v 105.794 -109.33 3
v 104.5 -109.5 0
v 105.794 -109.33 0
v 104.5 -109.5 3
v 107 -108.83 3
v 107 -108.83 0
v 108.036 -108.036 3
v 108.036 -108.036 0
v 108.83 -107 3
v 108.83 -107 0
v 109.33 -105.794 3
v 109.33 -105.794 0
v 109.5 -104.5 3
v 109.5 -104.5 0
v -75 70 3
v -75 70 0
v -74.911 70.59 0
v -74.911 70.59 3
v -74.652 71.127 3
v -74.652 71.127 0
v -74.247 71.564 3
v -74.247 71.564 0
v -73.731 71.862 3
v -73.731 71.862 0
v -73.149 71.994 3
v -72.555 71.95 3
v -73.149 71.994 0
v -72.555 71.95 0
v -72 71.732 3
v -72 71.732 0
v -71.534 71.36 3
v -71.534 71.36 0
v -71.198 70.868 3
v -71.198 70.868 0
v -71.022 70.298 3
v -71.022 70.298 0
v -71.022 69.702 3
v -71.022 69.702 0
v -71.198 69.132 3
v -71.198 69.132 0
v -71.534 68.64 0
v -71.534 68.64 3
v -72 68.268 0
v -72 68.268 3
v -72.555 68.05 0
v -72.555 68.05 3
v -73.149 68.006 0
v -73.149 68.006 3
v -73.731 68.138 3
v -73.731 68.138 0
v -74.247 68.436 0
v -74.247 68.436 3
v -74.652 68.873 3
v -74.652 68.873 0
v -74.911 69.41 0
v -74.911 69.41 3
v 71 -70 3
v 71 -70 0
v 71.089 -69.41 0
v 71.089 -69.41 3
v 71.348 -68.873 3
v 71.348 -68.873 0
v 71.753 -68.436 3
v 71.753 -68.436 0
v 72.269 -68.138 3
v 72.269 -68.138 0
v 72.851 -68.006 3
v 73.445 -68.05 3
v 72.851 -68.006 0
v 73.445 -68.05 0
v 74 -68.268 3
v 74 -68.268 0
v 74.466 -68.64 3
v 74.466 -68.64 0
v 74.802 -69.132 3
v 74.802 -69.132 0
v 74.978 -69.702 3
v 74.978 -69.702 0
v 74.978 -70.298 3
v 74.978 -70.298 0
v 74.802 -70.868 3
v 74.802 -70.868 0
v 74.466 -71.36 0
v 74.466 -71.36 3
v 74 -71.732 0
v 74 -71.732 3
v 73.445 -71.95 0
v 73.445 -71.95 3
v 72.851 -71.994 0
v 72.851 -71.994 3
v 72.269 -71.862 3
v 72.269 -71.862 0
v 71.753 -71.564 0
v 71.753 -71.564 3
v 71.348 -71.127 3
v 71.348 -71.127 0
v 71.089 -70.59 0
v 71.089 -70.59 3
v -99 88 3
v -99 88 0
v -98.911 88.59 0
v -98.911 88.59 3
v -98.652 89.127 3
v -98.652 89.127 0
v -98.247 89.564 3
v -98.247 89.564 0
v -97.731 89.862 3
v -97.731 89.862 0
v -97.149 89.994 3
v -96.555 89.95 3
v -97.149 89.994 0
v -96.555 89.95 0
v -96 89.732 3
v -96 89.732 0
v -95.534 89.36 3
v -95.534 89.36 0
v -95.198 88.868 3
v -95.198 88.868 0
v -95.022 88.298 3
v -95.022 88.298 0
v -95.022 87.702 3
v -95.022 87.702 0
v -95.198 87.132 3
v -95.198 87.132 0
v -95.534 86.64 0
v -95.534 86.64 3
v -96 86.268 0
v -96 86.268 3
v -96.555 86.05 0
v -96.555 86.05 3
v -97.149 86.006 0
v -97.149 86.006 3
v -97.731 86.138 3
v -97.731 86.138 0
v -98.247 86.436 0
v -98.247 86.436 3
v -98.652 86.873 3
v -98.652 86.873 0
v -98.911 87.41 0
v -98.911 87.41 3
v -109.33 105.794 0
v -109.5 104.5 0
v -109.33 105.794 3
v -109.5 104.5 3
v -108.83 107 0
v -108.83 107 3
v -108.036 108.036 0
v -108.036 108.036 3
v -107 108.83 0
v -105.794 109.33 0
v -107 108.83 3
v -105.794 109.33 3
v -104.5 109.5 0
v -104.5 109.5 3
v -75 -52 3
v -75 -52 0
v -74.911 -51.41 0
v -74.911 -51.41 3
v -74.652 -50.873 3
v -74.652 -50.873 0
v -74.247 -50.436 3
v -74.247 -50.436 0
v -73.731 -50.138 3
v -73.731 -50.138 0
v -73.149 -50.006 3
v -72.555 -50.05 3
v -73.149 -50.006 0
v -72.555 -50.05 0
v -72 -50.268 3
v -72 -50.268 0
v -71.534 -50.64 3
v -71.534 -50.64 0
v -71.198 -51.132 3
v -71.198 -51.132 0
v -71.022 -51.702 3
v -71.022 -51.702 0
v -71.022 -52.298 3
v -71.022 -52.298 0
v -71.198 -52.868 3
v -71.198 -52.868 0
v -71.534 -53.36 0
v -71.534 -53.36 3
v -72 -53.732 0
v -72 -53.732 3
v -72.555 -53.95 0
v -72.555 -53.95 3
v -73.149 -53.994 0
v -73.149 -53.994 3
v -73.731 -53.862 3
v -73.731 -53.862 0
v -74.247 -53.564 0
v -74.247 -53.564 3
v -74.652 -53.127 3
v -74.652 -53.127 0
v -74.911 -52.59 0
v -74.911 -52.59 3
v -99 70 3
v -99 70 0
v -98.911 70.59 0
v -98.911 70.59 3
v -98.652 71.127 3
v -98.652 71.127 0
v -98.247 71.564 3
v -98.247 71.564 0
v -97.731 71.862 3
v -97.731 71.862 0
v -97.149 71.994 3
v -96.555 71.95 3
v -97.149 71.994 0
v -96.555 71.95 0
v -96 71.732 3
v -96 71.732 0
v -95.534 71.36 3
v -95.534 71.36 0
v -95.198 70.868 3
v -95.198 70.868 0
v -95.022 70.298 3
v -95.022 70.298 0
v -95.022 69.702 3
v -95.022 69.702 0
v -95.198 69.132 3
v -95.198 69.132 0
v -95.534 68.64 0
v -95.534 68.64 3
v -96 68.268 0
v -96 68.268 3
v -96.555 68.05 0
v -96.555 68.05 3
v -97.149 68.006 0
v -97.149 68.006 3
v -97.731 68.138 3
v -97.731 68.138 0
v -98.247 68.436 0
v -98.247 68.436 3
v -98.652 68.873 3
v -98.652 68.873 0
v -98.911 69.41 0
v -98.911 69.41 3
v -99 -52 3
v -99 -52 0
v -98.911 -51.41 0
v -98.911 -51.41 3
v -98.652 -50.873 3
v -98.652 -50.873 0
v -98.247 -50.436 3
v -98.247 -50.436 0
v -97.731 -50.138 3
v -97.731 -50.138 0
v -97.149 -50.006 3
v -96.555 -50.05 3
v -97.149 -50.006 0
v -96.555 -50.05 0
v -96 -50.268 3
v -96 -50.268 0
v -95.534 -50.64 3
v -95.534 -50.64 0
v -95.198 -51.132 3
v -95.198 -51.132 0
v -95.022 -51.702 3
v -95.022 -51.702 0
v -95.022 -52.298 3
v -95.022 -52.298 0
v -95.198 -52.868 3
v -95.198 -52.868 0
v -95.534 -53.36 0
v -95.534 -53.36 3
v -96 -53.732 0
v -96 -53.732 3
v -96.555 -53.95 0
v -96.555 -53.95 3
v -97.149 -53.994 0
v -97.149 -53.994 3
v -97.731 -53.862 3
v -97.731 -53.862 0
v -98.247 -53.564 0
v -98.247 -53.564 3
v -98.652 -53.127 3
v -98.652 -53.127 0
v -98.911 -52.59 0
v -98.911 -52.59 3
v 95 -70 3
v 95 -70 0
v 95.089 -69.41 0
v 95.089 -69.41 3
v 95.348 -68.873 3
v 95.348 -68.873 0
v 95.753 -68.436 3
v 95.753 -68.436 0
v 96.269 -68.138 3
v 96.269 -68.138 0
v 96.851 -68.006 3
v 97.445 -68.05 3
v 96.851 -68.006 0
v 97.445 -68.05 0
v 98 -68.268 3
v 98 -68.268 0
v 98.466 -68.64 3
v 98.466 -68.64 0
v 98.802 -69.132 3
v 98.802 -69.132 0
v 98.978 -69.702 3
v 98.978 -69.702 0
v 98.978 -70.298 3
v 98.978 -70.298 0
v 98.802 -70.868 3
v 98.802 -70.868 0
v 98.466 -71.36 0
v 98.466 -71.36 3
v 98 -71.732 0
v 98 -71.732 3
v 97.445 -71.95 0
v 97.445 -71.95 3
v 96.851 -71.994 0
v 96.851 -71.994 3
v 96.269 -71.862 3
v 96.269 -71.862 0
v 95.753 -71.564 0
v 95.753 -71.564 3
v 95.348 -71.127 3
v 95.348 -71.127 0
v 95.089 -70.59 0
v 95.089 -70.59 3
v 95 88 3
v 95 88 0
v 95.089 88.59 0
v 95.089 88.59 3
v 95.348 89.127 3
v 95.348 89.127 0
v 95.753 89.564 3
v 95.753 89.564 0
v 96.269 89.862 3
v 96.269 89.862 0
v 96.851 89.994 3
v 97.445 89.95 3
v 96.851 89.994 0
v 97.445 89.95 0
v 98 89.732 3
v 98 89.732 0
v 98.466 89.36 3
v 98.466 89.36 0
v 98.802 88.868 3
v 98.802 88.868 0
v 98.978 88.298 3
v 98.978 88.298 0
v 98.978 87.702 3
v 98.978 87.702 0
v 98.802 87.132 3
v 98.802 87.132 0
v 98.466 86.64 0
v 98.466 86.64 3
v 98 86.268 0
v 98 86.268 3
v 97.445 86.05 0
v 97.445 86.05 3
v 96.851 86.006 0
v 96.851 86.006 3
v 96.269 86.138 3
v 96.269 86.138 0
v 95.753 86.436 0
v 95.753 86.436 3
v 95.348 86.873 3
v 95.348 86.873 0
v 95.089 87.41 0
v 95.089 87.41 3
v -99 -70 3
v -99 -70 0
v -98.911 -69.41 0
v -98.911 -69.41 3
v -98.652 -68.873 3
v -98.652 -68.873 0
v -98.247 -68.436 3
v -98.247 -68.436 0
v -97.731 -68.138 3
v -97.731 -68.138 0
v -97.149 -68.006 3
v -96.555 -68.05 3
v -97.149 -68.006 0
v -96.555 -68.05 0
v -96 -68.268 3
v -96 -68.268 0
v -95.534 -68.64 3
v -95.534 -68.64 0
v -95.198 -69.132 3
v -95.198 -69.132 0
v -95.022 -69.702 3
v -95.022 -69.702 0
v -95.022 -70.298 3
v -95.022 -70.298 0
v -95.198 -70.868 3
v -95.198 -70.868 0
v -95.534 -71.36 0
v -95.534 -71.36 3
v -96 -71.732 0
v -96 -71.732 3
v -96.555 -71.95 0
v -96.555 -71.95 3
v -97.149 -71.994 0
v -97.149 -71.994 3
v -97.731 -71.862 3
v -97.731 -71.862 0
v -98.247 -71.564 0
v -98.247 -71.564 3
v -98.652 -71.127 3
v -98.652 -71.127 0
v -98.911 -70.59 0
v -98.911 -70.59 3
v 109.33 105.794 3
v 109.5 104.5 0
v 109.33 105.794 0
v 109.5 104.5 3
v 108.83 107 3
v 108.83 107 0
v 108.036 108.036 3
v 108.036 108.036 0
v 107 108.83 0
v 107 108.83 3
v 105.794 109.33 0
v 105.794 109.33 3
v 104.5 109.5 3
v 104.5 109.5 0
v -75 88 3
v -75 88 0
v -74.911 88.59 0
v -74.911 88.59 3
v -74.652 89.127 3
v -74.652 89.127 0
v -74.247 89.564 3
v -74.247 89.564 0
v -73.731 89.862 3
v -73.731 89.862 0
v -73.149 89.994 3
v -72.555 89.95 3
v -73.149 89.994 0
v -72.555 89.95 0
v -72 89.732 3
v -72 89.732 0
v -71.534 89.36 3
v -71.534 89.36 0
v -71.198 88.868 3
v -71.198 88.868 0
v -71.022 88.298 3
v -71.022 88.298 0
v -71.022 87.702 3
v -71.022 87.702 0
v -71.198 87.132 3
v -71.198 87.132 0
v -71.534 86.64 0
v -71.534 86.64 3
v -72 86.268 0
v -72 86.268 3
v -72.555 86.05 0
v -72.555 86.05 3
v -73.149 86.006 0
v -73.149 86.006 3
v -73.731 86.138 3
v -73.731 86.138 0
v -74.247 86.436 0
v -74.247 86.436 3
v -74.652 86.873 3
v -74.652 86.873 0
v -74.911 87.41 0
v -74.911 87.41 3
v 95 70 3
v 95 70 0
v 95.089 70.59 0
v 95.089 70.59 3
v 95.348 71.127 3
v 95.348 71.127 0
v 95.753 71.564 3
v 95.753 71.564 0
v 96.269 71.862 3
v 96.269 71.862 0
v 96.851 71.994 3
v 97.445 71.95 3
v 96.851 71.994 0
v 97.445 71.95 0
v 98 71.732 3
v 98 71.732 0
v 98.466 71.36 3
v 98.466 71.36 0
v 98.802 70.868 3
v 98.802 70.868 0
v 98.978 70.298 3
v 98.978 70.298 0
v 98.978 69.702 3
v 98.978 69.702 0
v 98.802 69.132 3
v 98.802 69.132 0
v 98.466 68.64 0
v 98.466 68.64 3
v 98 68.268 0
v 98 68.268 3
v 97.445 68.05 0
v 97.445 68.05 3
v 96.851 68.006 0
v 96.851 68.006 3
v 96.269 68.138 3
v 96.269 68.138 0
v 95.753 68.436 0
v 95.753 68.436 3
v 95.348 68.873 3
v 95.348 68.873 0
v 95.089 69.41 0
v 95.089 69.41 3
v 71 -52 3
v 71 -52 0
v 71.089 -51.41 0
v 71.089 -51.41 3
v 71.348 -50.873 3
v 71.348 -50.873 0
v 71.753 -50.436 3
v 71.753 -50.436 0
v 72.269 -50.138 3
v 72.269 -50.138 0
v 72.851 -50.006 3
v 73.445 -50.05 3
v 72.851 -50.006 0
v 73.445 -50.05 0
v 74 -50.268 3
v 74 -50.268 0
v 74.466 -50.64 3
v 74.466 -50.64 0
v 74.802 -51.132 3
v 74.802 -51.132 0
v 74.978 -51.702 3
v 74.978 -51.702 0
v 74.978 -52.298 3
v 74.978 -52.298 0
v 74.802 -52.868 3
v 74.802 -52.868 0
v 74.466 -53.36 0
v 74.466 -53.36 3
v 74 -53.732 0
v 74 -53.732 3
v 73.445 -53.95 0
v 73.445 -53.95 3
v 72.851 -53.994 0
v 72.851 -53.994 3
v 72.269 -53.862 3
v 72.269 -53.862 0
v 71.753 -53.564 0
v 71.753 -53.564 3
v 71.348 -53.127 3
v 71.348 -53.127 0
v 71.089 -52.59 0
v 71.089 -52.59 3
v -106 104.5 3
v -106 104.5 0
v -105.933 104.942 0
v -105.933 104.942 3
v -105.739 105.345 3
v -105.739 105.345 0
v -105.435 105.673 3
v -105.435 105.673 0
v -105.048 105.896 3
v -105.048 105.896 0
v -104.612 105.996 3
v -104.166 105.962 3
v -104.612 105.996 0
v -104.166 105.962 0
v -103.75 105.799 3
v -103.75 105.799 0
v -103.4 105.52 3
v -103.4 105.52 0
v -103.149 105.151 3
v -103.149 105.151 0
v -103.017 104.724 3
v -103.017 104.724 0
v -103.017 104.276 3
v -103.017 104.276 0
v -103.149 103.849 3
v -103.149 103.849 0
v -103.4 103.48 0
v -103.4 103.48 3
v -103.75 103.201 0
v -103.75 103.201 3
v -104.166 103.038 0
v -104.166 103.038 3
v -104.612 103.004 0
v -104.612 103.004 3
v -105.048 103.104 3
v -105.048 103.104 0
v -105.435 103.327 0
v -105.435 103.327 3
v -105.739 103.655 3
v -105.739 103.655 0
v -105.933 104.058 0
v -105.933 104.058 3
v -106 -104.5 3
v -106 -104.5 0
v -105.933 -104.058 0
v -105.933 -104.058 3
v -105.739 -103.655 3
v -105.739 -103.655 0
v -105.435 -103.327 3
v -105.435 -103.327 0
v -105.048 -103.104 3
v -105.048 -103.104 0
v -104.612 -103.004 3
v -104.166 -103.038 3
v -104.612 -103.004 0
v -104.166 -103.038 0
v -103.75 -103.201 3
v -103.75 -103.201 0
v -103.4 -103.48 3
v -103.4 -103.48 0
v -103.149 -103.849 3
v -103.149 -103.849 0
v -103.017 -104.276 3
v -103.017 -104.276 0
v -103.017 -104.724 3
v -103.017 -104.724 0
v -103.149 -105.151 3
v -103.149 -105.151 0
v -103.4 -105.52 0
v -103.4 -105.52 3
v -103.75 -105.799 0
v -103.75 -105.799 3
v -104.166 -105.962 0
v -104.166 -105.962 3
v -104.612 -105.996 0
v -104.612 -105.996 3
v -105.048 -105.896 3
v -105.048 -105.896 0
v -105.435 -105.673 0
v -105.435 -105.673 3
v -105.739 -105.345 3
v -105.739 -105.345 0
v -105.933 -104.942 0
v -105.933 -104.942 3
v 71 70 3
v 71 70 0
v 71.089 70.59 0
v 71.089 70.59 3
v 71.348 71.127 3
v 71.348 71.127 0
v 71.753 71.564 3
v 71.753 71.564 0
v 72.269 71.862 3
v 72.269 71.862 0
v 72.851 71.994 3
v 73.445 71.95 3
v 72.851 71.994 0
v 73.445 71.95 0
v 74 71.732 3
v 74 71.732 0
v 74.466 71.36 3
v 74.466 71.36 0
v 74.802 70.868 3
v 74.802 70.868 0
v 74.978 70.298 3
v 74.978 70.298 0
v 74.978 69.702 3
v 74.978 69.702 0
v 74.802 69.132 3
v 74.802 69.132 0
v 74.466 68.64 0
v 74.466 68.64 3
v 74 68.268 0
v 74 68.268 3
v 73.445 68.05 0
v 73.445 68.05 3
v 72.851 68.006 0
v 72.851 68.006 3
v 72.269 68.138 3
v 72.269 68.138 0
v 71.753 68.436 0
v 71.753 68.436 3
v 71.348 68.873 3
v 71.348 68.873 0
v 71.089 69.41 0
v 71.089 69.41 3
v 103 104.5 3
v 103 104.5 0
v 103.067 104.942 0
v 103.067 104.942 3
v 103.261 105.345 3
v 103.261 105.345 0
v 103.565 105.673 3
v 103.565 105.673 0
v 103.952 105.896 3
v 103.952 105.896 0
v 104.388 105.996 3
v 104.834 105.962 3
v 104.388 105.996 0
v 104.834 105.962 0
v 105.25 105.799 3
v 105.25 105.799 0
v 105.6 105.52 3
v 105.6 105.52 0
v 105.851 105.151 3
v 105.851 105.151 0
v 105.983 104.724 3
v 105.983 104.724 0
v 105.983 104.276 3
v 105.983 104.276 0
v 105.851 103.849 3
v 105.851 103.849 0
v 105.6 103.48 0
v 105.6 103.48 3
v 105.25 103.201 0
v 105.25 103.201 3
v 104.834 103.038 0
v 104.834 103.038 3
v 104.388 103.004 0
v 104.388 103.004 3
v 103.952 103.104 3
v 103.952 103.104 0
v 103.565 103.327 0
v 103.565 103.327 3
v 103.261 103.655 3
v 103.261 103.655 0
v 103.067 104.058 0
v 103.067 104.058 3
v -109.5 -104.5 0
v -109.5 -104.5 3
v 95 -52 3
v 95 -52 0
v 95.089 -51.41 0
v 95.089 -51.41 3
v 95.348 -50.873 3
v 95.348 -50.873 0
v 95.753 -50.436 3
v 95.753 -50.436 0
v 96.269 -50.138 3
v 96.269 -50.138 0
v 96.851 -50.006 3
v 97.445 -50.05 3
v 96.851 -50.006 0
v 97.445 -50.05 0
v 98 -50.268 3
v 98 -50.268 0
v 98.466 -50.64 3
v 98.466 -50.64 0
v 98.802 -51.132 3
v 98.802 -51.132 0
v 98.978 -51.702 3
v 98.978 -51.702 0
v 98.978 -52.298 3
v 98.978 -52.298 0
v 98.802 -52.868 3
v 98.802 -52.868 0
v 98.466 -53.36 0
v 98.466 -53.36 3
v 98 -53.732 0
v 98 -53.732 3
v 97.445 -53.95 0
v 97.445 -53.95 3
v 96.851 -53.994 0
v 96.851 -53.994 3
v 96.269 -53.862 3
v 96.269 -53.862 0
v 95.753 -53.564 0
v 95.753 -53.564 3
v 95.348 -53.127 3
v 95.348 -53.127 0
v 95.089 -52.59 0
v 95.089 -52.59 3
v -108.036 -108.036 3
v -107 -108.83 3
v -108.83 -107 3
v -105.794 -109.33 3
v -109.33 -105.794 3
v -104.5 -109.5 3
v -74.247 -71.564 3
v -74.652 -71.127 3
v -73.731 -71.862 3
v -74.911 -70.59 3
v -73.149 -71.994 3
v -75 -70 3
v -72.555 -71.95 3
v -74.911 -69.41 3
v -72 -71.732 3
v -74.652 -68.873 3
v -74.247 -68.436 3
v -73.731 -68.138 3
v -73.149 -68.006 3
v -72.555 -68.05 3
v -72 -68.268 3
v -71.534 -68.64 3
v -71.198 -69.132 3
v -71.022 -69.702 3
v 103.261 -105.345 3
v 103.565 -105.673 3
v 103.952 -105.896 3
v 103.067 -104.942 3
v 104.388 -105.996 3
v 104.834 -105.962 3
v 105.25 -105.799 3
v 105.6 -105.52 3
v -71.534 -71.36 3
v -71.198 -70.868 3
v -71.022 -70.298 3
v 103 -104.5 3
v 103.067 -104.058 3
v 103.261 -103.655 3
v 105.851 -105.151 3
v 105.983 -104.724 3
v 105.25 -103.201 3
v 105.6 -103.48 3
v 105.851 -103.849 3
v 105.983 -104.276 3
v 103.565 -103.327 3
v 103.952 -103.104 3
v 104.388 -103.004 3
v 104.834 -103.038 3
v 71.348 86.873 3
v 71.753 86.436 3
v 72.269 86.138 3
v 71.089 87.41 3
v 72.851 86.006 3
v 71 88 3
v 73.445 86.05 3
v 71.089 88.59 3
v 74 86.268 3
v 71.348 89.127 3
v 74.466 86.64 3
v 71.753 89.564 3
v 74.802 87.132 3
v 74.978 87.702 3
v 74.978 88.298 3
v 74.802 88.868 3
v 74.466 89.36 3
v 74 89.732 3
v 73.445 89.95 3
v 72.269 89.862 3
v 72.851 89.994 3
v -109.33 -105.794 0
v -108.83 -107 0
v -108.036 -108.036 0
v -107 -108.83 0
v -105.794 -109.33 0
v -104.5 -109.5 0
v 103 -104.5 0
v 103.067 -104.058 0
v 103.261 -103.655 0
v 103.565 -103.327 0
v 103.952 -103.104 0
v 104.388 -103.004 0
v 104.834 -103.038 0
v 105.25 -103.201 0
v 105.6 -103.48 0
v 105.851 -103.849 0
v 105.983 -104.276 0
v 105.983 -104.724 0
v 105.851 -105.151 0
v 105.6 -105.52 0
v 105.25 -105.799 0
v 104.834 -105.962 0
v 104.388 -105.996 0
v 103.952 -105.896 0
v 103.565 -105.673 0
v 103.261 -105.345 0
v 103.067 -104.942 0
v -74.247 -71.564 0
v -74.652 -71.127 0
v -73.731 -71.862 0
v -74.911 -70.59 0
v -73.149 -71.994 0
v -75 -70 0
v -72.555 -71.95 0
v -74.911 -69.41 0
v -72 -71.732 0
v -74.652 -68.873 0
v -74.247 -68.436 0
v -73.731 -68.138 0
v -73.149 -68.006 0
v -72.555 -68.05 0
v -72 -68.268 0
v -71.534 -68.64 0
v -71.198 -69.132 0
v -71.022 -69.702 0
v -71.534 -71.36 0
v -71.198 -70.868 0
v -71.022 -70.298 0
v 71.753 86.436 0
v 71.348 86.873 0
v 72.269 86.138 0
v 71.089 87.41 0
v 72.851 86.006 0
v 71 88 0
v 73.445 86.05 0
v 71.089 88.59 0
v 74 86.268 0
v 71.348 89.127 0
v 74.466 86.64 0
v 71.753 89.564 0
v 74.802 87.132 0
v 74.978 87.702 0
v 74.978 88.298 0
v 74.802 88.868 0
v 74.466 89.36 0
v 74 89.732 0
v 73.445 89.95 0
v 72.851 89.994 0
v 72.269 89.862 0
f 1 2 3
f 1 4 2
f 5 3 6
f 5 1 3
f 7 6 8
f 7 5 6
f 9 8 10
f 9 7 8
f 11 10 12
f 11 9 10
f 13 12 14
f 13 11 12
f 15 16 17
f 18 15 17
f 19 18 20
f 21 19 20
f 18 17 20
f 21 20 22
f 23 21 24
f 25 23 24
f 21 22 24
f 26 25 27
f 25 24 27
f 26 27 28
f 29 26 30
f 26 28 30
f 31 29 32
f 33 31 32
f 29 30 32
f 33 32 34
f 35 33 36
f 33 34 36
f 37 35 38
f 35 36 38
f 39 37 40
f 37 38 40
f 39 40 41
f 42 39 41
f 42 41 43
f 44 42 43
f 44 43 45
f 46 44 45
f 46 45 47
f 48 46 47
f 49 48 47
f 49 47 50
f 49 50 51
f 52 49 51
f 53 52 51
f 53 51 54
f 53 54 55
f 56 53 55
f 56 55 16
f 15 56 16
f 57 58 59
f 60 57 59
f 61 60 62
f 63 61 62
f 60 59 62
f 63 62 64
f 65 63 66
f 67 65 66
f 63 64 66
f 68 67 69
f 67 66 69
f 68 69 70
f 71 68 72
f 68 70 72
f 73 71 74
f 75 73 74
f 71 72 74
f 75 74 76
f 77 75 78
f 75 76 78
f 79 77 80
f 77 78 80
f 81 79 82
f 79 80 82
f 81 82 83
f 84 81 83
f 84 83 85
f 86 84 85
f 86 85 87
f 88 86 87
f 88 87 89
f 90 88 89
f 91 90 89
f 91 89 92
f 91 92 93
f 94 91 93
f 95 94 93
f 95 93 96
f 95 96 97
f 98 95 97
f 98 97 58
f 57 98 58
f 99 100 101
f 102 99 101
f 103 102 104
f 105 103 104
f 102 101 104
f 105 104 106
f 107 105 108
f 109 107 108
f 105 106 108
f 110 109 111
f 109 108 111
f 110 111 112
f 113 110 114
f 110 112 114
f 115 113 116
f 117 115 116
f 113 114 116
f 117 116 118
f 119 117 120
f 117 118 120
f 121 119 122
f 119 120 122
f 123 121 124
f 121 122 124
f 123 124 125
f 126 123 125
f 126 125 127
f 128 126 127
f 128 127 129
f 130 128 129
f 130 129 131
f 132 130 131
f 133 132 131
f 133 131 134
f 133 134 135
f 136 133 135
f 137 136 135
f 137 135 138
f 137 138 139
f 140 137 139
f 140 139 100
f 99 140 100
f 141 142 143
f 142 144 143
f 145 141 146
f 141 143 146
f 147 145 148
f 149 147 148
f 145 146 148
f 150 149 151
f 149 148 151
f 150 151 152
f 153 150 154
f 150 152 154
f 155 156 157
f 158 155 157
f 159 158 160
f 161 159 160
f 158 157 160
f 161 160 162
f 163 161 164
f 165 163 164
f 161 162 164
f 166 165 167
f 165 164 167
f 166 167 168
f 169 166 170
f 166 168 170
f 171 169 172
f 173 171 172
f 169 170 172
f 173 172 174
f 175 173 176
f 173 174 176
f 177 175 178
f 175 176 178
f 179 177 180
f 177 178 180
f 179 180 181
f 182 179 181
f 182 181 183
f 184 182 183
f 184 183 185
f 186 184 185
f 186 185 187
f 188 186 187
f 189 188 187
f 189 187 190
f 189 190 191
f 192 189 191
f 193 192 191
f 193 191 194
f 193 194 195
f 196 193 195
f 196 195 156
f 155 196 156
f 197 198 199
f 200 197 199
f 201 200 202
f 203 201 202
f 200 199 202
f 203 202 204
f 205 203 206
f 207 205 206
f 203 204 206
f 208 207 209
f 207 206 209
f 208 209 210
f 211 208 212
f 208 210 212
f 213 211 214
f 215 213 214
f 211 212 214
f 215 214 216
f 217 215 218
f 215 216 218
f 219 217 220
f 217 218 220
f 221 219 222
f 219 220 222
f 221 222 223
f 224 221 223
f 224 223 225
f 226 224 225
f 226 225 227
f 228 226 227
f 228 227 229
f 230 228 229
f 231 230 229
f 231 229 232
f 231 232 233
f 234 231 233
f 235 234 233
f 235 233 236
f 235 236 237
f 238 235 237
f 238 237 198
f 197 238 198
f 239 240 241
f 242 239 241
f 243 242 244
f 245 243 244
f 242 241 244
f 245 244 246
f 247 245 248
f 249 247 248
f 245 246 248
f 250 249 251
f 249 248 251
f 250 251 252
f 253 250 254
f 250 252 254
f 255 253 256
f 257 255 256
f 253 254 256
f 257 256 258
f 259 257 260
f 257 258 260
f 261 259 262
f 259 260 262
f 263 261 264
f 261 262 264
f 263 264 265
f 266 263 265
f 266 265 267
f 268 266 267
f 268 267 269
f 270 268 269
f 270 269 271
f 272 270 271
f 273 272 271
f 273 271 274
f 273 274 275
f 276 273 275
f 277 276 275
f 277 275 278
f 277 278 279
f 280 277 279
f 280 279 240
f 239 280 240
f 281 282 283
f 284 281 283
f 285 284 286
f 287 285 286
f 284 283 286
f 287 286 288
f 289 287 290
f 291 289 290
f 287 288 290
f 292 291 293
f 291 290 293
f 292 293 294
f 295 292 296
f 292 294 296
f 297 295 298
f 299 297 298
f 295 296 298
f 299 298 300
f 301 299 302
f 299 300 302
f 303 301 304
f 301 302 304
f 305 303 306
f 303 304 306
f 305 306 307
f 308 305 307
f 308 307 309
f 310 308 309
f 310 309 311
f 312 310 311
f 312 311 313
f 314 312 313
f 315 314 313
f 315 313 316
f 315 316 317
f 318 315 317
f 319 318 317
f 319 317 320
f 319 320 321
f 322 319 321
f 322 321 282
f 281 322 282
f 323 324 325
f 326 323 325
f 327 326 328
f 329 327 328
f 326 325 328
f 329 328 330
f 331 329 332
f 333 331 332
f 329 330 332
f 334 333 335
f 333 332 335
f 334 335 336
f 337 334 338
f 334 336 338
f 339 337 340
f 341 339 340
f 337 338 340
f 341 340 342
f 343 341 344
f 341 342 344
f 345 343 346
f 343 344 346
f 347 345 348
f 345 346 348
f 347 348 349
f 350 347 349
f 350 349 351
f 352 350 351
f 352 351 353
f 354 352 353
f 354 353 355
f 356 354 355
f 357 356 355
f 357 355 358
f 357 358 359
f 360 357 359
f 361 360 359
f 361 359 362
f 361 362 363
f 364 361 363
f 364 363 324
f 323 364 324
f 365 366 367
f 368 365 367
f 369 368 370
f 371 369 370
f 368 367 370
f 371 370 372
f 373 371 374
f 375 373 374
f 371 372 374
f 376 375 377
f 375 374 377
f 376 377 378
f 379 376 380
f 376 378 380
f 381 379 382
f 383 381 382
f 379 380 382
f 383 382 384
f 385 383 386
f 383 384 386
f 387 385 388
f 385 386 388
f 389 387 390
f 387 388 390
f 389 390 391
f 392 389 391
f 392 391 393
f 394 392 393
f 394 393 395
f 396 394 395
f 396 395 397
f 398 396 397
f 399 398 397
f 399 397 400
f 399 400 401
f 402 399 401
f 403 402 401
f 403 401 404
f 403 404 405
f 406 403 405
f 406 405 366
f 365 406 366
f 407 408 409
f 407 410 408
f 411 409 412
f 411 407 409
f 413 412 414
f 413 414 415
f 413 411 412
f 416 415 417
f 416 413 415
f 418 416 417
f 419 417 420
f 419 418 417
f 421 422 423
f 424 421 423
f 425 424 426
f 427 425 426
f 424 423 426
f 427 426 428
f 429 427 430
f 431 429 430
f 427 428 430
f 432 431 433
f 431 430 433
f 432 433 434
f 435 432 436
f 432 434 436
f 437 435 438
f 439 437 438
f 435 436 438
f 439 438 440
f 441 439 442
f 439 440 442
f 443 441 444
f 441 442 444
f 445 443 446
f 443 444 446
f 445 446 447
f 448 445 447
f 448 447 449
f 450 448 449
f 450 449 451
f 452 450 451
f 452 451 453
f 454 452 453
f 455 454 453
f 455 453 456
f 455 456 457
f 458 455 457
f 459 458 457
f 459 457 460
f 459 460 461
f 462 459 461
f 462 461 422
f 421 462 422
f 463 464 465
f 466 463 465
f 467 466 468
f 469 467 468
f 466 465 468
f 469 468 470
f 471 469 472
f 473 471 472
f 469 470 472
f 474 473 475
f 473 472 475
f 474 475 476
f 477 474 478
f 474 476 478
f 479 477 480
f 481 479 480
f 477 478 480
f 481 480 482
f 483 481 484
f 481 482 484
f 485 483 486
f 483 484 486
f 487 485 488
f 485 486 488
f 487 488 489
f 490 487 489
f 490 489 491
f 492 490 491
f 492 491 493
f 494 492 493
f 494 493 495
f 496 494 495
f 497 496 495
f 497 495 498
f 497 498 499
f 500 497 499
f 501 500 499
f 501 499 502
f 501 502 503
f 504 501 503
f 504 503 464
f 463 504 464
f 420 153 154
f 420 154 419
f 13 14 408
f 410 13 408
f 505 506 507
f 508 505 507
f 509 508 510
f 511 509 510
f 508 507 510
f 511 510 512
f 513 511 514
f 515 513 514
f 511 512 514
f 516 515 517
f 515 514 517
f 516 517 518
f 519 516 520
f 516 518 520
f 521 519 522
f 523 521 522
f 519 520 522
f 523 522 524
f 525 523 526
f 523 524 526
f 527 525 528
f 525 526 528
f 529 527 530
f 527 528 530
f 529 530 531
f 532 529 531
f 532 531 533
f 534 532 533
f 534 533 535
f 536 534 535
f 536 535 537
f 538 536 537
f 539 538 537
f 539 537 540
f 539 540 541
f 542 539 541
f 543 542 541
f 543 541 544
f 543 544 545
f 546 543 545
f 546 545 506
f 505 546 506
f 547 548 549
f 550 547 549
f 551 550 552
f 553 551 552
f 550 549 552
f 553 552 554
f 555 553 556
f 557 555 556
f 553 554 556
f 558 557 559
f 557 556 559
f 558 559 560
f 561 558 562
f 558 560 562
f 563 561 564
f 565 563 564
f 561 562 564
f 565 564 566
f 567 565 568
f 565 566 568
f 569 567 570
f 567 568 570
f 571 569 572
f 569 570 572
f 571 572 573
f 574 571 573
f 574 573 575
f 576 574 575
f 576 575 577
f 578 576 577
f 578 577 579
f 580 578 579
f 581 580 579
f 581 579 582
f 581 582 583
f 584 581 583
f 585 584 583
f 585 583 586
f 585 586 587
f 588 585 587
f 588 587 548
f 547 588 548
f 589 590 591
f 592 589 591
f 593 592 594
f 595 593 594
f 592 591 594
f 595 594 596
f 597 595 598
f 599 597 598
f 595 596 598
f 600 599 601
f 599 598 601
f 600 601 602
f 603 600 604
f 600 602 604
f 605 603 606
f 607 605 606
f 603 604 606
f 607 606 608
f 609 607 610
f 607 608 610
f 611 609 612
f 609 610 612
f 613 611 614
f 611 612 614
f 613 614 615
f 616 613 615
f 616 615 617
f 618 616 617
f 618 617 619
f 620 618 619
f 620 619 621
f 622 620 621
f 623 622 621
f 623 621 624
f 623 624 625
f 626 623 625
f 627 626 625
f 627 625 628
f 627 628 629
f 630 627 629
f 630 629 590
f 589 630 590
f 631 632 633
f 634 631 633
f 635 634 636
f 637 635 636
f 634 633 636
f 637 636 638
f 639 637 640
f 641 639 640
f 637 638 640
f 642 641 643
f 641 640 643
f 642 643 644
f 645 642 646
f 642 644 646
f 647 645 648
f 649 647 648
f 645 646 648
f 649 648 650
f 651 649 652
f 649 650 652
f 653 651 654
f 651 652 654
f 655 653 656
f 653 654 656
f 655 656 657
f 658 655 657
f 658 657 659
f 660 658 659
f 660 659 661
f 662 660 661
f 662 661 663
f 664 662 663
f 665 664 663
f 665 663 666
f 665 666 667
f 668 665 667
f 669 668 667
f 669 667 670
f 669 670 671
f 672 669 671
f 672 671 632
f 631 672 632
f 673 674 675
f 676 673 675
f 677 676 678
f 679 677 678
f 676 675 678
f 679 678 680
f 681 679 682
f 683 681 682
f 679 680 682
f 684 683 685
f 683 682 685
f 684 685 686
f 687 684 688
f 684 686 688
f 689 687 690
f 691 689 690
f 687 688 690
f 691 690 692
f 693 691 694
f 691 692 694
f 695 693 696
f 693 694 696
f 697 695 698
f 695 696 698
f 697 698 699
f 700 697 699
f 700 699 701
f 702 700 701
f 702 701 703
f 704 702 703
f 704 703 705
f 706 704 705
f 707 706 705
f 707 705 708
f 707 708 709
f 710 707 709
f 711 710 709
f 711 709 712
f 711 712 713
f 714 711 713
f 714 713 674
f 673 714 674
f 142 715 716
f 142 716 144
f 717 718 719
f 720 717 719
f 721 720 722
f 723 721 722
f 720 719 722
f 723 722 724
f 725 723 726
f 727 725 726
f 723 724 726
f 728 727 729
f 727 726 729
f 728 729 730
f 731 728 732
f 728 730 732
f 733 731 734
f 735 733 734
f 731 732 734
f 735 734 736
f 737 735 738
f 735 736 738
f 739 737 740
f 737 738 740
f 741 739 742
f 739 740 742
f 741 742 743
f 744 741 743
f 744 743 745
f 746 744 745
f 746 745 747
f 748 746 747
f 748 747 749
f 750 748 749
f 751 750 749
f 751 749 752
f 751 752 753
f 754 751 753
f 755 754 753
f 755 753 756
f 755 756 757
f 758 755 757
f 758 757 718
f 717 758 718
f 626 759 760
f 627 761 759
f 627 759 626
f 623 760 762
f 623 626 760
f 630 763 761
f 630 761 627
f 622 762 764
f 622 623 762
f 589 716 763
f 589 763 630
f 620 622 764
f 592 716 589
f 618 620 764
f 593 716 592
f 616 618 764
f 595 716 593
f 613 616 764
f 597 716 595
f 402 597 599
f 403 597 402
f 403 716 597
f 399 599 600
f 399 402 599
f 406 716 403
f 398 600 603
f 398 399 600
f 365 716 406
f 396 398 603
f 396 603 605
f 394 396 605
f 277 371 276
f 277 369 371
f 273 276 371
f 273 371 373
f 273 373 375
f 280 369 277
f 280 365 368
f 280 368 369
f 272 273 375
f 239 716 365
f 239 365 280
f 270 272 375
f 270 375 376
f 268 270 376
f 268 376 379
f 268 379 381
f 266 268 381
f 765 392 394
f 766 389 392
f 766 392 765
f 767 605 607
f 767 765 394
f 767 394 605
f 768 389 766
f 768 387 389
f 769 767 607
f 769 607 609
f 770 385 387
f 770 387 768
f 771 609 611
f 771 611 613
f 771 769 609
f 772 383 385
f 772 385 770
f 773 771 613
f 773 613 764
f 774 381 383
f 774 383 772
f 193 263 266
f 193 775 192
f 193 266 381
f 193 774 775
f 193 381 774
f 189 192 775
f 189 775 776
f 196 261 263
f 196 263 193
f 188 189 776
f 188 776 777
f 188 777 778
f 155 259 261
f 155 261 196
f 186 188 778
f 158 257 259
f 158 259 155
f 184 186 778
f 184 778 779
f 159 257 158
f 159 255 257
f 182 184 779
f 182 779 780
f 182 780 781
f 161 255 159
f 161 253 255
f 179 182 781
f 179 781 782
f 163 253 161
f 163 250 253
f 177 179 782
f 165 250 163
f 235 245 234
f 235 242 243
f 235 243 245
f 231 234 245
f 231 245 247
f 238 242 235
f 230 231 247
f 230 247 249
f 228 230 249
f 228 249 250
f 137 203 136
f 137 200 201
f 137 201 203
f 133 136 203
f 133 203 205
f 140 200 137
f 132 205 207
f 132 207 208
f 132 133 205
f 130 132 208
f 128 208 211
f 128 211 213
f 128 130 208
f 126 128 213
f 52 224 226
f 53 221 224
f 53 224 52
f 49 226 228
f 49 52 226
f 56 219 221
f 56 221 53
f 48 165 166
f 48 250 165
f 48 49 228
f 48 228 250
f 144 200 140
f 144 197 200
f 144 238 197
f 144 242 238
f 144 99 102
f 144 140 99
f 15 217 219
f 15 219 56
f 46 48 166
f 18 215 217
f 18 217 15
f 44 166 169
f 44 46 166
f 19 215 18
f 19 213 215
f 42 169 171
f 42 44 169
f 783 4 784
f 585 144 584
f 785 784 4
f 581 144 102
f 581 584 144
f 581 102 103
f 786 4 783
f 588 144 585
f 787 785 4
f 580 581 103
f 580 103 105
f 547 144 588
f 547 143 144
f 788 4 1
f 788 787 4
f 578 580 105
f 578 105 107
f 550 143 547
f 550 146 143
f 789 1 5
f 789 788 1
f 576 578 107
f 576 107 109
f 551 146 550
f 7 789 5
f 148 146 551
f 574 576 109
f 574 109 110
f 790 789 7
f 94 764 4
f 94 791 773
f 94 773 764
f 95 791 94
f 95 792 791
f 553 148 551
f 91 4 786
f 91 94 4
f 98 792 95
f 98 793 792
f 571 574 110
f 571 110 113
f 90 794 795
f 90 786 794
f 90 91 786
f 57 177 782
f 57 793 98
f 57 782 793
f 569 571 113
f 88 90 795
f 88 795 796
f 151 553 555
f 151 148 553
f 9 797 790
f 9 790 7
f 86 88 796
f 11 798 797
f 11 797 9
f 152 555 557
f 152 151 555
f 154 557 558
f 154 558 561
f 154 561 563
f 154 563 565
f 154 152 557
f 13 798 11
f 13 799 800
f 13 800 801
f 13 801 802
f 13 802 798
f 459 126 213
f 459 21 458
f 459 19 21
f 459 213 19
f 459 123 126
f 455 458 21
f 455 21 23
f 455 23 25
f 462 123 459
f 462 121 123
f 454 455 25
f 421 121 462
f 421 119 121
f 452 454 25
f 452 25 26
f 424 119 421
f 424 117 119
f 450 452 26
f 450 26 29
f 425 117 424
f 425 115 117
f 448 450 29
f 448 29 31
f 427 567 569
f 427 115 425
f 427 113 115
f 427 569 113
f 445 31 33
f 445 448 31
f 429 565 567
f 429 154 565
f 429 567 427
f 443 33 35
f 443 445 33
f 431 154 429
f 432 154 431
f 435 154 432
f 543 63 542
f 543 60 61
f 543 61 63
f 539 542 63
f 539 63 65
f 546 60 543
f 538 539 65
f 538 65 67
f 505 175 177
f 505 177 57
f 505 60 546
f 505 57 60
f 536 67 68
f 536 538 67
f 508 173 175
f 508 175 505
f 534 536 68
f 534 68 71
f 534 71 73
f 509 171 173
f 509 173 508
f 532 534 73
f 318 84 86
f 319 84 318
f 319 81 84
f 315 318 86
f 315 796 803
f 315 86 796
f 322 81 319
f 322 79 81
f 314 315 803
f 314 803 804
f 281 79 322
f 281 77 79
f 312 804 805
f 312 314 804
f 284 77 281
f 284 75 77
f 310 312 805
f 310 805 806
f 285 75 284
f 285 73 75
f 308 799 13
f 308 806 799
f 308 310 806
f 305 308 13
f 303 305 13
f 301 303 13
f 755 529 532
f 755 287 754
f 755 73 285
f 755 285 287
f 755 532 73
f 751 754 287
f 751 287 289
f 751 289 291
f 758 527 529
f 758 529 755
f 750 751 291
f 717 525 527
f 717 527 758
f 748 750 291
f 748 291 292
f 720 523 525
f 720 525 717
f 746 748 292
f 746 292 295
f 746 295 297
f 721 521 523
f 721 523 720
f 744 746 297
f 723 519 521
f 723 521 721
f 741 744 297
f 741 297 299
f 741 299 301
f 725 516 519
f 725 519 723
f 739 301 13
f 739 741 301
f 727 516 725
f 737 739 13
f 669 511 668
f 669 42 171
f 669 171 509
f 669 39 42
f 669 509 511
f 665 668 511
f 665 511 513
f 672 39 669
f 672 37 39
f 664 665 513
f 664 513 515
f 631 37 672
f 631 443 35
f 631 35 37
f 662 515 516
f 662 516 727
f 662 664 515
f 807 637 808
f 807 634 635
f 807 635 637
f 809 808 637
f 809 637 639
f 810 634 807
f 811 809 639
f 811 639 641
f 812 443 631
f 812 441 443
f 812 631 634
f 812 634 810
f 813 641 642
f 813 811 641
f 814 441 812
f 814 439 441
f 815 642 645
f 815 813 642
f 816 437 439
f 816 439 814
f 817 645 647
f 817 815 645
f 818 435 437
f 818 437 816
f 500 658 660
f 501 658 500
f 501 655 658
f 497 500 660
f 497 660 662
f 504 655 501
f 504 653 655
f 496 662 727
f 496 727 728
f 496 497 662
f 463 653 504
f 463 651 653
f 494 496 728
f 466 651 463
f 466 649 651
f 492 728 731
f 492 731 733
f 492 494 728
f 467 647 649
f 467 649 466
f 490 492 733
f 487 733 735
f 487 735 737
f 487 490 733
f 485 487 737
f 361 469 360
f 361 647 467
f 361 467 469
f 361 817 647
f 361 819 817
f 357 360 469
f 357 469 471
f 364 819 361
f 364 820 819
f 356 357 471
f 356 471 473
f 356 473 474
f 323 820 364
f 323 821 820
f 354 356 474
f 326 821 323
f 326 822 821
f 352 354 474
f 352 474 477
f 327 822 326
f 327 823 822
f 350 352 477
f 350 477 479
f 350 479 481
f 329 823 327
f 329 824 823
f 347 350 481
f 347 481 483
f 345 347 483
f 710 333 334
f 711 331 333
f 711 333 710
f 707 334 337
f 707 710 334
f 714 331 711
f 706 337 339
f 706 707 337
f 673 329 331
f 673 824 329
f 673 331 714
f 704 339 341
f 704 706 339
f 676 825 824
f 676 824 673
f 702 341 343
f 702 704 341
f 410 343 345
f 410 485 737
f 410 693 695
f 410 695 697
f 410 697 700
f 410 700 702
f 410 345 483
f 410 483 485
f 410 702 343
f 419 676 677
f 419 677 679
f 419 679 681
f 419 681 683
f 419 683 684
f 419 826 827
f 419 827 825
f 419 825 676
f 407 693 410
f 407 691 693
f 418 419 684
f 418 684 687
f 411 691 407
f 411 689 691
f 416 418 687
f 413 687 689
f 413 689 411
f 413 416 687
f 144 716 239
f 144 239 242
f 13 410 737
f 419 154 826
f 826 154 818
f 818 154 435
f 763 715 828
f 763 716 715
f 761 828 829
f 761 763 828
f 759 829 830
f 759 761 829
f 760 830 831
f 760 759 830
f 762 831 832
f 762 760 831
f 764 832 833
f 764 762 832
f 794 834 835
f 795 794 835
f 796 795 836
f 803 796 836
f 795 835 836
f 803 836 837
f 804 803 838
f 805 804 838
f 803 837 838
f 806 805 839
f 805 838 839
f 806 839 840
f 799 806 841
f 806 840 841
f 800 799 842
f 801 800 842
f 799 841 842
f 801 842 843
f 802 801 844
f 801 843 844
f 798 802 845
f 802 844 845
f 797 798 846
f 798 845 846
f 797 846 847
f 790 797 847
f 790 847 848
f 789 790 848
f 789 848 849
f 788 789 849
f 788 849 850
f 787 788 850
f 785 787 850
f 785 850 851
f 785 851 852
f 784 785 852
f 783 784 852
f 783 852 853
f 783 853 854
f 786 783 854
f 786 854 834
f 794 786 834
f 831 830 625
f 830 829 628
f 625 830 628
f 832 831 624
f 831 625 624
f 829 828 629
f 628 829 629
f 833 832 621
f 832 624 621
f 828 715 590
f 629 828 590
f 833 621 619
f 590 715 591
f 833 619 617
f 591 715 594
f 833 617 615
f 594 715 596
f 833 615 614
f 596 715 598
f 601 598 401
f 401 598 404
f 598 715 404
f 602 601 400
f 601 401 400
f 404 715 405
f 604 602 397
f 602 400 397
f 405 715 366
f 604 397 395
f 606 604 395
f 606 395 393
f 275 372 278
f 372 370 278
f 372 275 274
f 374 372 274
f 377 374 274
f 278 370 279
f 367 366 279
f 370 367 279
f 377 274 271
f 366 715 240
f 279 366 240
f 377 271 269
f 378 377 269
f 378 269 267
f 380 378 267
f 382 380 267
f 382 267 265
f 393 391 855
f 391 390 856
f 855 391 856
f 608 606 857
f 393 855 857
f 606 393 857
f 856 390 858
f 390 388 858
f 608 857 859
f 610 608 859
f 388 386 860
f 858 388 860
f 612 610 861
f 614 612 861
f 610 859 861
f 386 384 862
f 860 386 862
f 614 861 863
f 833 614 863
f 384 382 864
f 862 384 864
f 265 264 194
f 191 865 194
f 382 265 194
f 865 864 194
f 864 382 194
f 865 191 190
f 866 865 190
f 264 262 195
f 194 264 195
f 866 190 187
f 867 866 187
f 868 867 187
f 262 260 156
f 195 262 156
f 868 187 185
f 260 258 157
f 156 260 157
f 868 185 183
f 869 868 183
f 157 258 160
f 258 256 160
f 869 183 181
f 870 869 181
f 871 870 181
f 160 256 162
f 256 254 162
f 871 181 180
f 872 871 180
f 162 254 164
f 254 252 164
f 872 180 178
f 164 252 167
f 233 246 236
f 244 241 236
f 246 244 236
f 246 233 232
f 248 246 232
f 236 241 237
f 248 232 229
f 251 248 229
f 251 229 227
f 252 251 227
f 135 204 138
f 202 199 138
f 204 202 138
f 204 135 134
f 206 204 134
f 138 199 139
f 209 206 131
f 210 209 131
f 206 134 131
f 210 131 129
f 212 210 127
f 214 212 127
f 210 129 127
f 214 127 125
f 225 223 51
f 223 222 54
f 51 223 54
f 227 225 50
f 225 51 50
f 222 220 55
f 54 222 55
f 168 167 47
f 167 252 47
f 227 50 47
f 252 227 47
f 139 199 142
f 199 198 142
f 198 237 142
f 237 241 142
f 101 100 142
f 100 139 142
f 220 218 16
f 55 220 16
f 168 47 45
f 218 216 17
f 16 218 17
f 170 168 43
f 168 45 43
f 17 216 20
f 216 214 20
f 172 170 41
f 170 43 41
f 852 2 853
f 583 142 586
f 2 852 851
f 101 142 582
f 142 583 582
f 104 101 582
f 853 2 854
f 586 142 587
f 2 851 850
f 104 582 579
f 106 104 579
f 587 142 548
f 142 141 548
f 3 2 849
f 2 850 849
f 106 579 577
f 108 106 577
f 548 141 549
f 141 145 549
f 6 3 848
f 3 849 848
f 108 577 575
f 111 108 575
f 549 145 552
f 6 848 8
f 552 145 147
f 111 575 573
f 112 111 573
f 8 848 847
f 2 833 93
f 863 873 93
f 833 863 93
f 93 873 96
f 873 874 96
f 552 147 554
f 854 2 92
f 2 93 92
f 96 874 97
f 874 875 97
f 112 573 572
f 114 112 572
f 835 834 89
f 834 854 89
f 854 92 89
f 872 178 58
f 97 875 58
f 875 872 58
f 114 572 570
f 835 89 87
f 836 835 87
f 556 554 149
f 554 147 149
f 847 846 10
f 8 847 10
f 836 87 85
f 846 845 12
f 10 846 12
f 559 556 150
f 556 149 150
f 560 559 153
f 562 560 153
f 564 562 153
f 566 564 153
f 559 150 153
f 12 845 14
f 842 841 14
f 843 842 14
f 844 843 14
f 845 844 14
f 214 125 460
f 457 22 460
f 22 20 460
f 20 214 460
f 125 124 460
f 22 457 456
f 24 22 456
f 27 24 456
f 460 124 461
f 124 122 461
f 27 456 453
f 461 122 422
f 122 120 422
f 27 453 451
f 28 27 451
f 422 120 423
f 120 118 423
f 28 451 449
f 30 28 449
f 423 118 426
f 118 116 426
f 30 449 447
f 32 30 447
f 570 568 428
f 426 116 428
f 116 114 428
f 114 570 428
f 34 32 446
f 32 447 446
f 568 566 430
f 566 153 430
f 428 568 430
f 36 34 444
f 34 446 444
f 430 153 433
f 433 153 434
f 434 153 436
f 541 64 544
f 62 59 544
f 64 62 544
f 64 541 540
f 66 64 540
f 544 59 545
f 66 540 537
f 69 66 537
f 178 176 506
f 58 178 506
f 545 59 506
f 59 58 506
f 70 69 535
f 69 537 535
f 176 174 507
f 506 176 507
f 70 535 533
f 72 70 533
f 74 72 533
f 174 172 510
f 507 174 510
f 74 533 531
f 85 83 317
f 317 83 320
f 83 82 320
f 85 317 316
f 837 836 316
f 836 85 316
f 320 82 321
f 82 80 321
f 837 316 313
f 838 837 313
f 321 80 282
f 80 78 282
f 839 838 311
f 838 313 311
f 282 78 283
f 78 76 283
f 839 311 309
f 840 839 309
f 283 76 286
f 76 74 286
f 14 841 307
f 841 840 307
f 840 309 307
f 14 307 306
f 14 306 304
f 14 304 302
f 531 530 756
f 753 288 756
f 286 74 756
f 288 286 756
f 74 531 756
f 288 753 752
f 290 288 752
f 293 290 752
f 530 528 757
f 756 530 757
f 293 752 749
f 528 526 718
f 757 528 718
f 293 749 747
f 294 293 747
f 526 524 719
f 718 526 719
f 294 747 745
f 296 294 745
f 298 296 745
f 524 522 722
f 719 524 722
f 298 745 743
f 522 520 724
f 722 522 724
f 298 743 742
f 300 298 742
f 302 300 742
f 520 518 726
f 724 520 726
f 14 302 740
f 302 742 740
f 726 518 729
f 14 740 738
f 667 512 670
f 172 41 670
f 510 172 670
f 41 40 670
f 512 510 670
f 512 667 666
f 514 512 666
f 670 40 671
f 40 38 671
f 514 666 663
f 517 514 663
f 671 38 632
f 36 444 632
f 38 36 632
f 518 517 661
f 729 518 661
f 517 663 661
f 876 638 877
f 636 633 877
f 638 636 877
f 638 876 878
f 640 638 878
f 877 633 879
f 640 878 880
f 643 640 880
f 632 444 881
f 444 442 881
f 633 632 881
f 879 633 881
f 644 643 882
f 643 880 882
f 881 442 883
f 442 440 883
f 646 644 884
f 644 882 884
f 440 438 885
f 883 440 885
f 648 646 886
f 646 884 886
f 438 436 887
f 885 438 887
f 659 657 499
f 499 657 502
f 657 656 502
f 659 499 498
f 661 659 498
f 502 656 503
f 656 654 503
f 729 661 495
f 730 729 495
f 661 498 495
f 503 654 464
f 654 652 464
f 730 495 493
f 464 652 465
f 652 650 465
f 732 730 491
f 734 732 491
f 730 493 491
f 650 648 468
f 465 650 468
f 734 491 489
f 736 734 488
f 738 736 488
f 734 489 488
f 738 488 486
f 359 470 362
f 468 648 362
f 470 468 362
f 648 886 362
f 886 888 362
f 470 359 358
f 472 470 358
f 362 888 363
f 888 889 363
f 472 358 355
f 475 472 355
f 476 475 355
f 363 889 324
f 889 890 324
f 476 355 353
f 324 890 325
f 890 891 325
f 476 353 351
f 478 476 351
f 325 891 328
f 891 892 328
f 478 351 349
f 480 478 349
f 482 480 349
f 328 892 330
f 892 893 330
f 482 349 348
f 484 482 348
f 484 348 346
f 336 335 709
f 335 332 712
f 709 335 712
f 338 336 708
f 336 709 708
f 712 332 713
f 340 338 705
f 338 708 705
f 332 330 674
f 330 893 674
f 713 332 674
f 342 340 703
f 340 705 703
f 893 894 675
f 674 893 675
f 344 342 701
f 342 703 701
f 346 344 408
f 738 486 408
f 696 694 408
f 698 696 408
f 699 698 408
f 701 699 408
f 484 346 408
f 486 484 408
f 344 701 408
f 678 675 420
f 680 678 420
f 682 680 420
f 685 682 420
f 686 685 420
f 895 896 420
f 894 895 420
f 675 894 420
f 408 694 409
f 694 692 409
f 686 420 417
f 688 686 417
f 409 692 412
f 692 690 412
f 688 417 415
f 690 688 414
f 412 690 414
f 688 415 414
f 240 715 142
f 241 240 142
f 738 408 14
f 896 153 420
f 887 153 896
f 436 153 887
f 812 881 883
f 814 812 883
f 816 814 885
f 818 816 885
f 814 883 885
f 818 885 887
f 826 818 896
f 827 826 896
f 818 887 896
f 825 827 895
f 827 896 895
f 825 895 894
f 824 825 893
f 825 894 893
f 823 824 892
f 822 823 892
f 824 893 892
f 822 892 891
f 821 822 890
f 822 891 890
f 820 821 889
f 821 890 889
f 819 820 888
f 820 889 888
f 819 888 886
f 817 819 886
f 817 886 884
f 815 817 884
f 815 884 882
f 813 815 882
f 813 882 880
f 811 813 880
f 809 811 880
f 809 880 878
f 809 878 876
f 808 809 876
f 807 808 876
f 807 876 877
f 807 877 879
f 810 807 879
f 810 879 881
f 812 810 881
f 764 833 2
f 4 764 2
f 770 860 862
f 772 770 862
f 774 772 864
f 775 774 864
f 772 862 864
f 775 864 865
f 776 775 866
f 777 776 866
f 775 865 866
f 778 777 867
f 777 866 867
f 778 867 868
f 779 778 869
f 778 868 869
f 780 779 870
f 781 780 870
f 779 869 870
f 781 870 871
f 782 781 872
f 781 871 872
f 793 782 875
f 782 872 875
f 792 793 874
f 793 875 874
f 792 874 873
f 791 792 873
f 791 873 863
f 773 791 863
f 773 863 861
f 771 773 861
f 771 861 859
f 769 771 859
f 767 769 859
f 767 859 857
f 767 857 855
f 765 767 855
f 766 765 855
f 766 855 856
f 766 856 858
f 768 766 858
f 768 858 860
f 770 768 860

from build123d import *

# Parameters (mm, degrees)
F0_W     = 219
F0_H     = 219
F1_DEPTH = 3
F2_R     = 5
F4_D     = 3
F6_D     = 4


with BuildPart() as f1:
    # F0 (on Top) → F1 (new body)
    with BuildSketch(Plane.XY):
        Rectangle(F0_W, F0_H)
    extrude(amount=F1_DEPTH)

    # F2
    f2_edges = [f1.edges().sort_by_distance(p)[0] for p in [
        (109.5, -109.5, 1.5),
        (109.5, 109.5, 1.5),
        (-109.5, 109.5, 1.5),
        (-109.5, -109.5, 1.5),
    ]]
    fillet(f2_edges, radius=F2_R)

    # F4 (through all)
    with Locations(Plane.XY.offset(3)):
        with Locations((-104.5, -104.5), (104.5, -104.5), (104.5, 104.5), (-104.5, 104.5)):
            Hole(F4_D / 2)

    # F6 (through all)
    with Locations(Plane.XY.offset(3)):
        with Locations((-97, -70), (-73, -70), (-73, -52), (-97, -52), (-97, 70), (-73, 70), (-73, 88), (-97, 88), (73, 88), (73, 70), (97, 70), (97, 88), (97, -52), (97, -70), (73, -70), (73, -52)):
            Hole(F6_D / 2)


solid = f1.part
